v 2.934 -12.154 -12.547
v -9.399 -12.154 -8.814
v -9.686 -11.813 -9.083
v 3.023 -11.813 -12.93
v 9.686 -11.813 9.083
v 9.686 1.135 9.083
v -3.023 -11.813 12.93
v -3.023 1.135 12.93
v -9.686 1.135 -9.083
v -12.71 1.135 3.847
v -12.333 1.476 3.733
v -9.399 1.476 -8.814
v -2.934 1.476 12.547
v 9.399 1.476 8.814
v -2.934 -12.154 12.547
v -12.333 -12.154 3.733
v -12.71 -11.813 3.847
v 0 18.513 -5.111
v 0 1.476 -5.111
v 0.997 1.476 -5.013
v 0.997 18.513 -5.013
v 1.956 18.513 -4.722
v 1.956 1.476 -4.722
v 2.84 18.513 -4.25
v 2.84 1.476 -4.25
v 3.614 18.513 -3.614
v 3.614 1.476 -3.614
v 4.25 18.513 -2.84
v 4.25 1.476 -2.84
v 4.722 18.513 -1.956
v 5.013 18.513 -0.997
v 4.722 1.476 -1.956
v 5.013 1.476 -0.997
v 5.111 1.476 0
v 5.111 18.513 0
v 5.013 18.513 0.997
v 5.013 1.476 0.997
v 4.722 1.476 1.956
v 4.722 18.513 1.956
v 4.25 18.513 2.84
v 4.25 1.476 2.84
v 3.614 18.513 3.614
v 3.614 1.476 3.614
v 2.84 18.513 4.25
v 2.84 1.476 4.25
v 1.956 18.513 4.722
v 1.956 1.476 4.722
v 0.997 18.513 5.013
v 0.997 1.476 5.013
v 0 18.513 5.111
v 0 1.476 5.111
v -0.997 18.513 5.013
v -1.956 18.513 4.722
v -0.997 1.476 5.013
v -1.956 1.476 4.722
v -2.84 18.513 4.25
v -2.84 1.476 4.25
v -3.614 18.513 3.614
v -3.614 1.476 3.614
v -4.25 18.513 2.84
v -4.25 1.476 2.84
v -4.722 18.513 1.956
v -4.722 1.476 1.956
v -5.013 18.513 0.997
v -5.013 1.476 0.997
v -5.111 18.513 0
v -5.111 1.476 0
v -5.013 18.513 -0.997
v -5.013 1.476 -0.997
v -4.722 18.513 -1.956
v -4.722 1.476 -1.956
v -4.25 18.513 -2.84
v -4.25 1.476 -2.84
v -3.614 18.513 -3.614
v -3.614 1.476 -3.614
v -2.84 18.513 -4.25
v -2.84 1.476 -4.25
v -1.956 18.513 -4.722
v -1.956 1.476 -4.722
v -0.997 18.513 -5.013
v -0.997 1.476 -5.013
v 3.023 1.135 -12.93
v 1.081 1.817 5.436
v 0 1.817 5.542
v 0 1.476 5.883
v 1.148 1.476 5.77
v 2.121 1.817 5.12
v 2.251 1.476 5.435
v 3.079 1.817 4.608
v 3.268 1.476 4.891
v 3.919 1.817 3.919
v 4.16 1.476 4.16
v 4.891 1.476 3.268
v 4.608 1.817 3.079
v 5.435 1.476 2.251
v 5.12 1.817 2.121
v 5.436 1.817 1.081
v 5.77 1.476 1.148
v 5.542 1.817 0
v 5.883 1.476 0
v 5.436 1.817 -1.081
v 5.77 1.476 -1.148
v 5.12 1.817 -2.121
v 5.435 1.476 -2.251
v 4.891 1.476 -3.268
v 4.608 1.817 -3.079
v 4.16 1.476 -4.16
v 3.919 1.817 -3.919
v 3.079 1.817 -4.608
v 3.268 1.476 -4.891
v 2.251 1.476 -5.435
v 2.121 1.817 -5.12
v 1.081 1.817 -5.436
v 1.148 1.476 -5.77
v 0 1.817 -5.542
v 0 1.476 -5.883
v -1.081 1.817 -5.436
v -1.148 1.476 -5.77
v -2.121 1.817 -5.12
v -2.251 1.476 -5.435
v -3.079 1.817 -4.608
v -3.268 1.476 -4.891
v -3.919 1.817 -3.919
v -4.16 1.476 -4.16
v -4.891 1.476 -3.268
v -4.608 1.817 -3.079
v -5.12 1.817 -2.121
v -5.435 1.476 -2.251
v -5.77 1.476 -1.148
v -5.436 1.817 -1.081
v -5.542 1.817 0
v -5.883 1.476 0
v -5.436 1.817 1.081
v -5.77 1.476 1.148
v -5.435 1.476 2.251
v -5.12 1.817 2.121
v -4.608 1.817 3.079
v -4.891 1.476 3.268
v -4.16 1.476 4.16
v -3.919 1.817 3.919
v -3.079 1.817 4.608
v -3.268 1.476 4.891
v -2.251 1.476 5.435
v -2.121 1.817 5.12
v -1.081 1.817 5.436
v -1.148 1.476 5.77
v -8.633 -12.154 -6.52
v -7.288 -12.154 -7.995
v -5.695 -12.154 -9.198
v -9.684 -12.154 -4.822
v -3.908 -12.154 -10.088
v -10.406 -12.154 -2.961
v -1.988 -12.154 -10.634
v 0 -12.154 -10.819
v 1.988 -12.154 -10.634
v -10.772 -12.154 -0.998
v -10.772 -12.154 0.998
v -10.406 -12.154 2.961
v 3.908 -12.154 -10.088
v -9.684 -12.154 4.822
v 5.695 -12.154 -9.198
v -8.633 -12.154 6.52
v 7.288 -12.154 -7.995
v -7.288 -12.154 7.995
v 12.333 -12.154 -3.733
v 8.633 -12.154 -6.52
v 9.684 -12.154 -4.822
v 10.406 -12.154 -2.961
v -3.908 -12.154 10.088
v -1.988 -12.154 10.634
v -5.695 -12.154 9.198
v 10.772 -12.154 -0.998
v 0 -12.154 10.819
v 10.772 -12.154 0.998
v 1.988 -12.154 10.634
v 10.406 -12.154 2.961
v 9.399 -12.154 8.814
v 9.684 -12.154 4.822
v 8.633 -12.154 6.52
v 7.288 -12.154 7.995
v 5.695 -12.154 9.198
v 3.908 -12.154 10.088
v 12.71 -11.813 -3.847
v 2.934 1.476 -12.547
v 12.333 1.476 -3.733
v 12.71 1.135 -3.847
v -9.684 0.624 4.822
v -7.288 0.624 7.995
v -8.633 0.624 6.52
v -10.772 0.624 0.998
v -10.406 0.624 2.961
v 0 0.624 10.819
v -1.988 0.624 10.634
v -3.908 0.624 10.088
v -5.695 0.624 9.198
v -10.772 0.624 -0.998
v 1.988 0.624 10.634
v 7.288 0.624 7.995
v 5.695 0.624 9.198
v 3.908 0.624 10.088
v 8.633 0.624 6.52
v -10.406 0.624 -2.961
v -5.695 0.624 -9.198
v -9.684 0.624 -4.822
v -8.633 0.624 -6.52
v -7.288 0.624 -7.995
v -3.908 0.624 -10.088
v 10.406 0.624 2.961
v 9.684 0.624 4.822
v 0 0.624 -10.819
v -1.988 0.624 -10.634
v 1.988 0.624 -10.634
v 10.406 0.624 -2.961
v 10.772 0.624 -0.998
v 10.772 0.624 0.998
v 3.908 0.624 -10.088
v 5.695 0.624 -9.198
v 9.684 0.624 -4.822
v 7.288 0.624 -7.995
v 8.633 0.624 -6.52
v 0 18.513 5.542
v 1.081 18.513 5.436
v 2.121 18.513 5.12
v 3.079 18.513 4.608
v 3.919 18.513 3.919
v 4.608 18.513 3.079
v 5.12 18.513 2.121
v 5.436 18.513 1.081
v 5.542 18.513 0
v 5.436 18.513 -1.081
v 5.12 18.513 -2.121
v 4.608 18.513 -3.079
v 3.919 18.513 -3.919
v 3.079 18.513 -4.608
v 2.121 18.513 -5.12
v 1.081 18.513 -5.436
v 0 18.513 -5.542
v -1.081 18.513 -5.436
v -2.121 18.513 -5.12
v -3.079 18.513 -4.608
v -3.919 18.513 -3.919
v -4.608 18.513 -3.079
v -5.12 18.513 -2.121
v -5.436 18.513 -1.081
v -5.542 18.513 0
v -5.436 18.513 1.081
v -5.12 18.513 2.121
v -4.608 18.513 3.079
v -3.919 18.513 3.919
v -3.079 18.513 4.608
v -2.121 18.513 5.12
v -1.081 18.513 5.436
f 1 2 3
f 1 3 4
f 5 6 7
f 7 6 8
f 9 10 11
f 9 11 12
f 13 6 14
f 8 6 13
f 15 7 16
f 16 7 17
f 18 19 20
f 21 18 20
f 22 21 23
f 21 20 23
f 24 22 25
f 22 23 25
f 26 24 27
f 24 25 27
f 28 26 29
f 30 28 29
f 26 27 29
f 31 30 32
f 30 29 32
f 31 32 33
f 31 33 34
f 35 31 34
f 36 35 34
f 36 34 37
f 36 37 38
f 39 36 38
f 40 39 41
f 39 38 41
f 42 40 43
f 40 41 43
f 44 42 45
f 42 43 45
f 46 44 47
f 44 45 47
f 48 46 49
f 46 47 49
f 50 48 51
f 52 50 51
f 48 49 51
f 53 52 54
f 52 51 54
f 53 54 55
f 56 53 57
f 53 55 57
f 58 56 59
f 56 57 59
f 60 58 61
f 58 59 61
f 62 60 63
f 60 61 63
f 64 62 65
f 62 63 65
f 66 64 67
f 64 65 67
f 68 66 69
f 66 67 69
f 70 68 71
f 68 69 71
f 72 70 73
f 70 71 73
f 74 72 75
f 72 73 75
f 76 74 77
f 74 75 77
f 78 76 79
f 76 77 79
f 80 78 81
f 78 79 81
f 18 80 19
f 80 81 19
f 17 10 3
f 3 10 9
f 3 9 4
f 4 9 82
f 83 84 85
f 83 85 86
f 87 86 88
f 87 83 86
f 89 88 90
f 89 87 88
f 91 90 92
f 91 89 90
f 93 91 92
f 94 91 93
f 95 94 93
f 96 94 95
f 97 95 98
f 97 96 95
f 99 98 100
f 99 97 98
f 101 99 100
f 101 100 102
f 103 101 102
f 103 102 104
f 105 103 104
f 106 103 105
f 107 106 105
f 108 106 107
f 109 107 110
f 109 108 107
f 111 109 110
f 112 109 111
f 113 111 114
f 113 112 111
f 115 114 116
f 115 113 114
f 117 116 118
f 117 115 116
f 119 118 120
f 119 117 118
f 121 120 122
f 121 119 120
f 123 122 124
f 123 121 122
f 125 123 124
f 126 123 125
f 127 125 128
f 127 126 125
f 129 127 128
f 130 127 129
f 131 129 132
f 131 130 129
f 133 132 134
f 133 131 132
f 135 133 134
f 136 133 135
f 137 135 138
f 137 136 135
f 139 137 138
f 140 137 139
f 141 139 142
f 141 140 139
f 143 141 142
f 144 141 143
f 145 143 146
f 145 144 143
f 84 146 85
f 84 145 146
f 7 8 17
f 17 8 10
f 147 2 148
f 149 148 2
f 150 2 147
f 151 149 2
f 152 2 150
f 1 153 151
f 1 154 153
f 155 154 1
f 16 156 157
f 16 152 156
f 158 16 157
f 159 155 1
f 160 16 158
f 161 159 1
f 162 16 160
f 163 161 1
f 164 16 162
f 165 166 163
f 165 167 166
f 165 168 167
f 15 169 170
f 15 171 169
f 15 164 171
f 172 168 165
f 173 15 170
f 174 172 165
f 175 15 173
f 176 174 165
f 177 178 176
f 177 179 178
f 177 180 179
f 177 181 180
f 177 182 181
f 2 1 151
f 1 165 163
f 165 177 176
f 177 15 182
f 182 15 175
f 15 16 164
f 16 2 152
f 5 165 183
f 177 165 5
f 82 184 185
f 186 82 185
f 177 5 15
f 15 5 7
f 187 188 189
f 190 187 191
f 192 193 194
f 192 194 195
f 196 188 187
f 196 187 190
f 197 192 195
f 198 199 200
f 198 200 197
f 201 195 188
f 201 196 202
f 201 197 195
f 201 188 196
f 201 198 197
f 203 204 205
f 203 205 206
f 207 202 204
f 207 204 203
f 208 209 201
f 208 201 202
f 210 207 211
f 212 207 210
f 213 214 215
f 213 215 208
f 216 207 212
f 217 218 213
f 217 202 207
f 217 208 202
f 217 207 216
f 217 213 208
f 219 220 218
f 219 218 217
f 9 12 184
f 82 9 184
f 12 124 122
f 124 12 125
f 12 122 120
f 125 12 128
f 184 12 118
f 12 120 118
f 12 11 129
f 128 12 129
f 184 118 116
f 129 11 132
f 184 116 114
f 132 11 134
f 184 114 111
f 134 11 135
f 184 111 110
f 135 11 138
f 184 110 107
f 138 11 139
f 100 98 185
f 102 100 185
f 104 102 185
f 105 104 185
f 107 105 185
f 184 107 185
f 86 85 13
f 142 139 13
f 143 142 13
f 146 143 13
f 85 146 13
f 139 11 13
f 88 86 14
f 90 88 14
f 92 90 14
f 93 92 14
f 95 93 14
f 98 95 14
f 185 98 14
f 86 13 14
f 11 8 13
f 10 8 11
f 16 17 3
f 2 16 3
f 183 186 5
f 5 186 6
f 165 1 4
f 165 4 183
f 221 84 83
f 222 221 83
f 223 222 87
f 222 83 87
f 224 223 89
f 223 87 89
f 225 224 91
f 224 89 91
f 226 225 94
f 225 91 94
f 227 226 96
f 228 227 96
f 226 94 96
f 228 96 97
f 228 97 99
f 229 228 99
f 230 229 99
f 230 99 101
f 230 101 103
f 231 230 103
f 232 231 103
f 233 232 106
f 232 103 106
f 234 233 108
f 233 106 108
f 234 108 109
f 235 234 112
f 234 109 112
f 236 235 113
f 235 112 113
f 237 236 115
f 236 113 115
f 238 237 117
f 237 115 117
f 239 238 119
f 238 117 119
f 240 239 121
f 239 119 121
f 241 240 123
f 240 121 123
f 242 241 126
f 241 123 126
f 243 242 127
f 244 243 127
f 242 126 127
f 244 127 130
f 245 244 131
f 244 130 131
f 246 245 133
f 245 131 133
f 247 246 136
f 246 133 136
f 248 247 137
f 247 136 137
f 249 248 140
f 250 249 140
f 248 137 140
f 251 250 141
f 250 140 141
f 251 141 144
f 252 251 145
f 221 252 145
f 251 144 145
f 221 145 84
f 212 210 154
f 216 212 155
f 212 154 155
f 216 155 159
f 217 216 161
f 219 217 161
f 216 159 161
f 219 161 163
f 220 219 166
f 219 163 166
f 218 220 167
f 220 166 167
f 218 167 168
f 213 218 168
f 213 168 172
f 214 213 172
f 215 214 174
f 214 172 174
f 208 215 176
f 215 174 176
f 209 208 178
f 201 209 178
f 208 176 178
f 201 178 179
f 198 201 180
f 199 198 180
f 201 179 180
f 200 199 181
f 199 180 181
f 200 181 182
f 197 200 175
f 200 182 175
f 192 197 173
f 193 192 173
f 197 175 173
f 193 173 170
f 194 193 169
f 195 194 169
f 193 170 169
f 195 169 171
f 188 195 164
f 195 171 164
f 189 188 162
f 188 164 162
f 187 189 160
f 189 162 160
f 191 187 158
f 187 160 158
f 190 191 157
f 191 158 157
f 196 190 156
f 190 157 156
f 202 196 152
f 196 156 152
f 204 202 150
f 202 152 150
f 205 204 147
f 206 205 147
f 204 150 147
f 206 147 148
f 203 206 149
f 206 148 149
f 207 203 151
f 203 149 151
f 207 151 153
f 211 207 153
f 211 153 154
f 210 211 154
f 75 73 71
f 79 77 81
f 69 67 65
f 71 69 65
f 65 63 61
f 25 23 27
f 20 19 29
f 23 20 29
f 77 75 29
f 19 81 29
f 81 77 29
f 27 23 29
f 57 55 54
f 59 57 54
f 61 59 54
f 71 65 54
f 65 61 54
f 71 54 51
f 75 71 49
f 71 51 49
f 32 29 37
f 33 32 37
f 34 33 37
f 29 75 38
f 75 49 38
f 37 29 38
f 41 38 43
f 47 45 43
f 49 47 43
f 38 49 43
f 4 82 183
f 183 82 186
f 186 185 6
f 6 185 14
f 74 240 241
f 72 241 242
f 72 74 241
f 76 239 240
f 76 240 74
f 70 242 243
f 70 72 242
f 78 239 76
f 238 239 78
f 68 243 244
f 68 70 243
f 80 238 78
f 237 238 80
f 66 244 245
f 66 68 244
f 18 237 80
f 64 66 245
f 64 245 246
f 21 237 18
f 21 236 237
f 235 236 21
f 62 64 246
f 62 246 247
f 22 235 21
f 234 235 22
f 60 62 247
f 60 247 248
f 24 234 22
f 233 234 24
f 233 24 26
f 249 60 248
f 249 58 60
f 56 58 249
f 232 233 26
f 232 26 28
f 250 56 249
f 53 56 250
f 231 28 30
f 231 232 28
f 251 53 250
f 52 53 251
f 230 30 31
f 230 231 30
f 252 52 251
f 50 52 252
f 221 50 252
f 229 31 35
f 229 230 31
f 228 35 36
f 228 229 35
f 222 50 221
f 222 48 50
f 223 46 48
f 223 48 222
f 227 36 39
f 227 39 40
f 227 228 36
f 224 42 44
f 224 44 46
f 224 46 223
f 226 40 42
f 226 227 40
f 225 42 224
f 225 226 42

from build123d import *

# Parameters (mm, degrees)
SKETCH_1_R          = 3.253
EXTRUDE_1_DEPTH     = 10
SKETCH_2_R          = 3
CUT_EXTRUDE_1_DEPTH = 10
EXTRUDE_2_DEPTH     = 8
CHAMFER_2_SIZE      = 0.2
SKETCH_6_R          = 6.35
CUT_EXTRUDE_3_DEPTH = 7.5
SCALE_1_SCALE       = 1.703703703


with BuildPart() as part:
    # 草图1 → 凸台-拉伸1 (new body)
    with BuildSketch(Plane(origin=(0, 0, 0), x_dir=(1, 0, 0), z_dir=(0, 1, 0))):
        with Locations(Location((0, 0, 0), (0, 0, 270))):
            Circle(SKETCH_1_R)
    extrude(amount=EXTRUDE_1_DEPTH)

    # 草图2 → 切除-拉伸1 (cut)
    with BuildSketch(Plane.XZ):
        with Locations(Location((0, 0, 0), (0, 0, 270))):
            Circle(SKETCH_2_R)
    extrude(amount=-CUT_EXTRUDE_1_DEPTH, mode=Mode.SUBTRACT)

    # 草图3 → 凸台-拉伸2 (add)
    with BuildSketch(Plane.XZ):
        Polygon((1.774601568, -7.589518382), (7.460016506, -2.257909151), (5.685414937, 5.331609231), (-1.774601568, 7.589518382), (-7.460016506, 2.257909151), (-5.685414937, -5.331609231), align=None)
    extrude(amount=EXTRUDE_2_DEPTH)

    # 倒角2
    chamfer_2_edges = [part.edges().sort_by_distance(p)[0] for p in [
        (0, 0, -3.253),
        (-1.955406684, 0, -6.460563807),
        (4.617309037, 0, -4.923713767),
        (6.572715721, 0, 1.53685004),
        (1.955406684, 0, 6.460563807),
        (-4.617309037, 0, 4.923713767),
        (-6.572715721, 0, -1.53685004),
        (-1.955406684, -8, -6.460563807),
        (4.617309037, -8, -4.923713767),
        (6.572715721, -8, 1.53685004),
        (1.955406684, -8, 6.460563807),
        (-4.617309037, -8, 4.923713767),
        (-6.572715721, -8, -1.53685004),
    ]]
    chamfer(chamfer_2_edges, length=CHAMFER_2_SIZE)

    # 草图6 → 切除-拉伸3 (cut)
    with BuildSketch(Plane.XZ.offset(8)):
        with Locations(Location((0, 0, 0), (0, 0, 270))):
            Circle(SKETCH_6_R)
    extrude(amount=-CUT_EXTRUDE_3_DEPTH, mode=Mode.SUBTRACT)


with BuildPart() as part_1:
    # 缩放比例1: scaled about (0, -2.097517818, 0)
    add(part.part.scale(SCALE_1_SCALE).moved(Location((0, 1.476031056, 0))))


solid = part_1.part
